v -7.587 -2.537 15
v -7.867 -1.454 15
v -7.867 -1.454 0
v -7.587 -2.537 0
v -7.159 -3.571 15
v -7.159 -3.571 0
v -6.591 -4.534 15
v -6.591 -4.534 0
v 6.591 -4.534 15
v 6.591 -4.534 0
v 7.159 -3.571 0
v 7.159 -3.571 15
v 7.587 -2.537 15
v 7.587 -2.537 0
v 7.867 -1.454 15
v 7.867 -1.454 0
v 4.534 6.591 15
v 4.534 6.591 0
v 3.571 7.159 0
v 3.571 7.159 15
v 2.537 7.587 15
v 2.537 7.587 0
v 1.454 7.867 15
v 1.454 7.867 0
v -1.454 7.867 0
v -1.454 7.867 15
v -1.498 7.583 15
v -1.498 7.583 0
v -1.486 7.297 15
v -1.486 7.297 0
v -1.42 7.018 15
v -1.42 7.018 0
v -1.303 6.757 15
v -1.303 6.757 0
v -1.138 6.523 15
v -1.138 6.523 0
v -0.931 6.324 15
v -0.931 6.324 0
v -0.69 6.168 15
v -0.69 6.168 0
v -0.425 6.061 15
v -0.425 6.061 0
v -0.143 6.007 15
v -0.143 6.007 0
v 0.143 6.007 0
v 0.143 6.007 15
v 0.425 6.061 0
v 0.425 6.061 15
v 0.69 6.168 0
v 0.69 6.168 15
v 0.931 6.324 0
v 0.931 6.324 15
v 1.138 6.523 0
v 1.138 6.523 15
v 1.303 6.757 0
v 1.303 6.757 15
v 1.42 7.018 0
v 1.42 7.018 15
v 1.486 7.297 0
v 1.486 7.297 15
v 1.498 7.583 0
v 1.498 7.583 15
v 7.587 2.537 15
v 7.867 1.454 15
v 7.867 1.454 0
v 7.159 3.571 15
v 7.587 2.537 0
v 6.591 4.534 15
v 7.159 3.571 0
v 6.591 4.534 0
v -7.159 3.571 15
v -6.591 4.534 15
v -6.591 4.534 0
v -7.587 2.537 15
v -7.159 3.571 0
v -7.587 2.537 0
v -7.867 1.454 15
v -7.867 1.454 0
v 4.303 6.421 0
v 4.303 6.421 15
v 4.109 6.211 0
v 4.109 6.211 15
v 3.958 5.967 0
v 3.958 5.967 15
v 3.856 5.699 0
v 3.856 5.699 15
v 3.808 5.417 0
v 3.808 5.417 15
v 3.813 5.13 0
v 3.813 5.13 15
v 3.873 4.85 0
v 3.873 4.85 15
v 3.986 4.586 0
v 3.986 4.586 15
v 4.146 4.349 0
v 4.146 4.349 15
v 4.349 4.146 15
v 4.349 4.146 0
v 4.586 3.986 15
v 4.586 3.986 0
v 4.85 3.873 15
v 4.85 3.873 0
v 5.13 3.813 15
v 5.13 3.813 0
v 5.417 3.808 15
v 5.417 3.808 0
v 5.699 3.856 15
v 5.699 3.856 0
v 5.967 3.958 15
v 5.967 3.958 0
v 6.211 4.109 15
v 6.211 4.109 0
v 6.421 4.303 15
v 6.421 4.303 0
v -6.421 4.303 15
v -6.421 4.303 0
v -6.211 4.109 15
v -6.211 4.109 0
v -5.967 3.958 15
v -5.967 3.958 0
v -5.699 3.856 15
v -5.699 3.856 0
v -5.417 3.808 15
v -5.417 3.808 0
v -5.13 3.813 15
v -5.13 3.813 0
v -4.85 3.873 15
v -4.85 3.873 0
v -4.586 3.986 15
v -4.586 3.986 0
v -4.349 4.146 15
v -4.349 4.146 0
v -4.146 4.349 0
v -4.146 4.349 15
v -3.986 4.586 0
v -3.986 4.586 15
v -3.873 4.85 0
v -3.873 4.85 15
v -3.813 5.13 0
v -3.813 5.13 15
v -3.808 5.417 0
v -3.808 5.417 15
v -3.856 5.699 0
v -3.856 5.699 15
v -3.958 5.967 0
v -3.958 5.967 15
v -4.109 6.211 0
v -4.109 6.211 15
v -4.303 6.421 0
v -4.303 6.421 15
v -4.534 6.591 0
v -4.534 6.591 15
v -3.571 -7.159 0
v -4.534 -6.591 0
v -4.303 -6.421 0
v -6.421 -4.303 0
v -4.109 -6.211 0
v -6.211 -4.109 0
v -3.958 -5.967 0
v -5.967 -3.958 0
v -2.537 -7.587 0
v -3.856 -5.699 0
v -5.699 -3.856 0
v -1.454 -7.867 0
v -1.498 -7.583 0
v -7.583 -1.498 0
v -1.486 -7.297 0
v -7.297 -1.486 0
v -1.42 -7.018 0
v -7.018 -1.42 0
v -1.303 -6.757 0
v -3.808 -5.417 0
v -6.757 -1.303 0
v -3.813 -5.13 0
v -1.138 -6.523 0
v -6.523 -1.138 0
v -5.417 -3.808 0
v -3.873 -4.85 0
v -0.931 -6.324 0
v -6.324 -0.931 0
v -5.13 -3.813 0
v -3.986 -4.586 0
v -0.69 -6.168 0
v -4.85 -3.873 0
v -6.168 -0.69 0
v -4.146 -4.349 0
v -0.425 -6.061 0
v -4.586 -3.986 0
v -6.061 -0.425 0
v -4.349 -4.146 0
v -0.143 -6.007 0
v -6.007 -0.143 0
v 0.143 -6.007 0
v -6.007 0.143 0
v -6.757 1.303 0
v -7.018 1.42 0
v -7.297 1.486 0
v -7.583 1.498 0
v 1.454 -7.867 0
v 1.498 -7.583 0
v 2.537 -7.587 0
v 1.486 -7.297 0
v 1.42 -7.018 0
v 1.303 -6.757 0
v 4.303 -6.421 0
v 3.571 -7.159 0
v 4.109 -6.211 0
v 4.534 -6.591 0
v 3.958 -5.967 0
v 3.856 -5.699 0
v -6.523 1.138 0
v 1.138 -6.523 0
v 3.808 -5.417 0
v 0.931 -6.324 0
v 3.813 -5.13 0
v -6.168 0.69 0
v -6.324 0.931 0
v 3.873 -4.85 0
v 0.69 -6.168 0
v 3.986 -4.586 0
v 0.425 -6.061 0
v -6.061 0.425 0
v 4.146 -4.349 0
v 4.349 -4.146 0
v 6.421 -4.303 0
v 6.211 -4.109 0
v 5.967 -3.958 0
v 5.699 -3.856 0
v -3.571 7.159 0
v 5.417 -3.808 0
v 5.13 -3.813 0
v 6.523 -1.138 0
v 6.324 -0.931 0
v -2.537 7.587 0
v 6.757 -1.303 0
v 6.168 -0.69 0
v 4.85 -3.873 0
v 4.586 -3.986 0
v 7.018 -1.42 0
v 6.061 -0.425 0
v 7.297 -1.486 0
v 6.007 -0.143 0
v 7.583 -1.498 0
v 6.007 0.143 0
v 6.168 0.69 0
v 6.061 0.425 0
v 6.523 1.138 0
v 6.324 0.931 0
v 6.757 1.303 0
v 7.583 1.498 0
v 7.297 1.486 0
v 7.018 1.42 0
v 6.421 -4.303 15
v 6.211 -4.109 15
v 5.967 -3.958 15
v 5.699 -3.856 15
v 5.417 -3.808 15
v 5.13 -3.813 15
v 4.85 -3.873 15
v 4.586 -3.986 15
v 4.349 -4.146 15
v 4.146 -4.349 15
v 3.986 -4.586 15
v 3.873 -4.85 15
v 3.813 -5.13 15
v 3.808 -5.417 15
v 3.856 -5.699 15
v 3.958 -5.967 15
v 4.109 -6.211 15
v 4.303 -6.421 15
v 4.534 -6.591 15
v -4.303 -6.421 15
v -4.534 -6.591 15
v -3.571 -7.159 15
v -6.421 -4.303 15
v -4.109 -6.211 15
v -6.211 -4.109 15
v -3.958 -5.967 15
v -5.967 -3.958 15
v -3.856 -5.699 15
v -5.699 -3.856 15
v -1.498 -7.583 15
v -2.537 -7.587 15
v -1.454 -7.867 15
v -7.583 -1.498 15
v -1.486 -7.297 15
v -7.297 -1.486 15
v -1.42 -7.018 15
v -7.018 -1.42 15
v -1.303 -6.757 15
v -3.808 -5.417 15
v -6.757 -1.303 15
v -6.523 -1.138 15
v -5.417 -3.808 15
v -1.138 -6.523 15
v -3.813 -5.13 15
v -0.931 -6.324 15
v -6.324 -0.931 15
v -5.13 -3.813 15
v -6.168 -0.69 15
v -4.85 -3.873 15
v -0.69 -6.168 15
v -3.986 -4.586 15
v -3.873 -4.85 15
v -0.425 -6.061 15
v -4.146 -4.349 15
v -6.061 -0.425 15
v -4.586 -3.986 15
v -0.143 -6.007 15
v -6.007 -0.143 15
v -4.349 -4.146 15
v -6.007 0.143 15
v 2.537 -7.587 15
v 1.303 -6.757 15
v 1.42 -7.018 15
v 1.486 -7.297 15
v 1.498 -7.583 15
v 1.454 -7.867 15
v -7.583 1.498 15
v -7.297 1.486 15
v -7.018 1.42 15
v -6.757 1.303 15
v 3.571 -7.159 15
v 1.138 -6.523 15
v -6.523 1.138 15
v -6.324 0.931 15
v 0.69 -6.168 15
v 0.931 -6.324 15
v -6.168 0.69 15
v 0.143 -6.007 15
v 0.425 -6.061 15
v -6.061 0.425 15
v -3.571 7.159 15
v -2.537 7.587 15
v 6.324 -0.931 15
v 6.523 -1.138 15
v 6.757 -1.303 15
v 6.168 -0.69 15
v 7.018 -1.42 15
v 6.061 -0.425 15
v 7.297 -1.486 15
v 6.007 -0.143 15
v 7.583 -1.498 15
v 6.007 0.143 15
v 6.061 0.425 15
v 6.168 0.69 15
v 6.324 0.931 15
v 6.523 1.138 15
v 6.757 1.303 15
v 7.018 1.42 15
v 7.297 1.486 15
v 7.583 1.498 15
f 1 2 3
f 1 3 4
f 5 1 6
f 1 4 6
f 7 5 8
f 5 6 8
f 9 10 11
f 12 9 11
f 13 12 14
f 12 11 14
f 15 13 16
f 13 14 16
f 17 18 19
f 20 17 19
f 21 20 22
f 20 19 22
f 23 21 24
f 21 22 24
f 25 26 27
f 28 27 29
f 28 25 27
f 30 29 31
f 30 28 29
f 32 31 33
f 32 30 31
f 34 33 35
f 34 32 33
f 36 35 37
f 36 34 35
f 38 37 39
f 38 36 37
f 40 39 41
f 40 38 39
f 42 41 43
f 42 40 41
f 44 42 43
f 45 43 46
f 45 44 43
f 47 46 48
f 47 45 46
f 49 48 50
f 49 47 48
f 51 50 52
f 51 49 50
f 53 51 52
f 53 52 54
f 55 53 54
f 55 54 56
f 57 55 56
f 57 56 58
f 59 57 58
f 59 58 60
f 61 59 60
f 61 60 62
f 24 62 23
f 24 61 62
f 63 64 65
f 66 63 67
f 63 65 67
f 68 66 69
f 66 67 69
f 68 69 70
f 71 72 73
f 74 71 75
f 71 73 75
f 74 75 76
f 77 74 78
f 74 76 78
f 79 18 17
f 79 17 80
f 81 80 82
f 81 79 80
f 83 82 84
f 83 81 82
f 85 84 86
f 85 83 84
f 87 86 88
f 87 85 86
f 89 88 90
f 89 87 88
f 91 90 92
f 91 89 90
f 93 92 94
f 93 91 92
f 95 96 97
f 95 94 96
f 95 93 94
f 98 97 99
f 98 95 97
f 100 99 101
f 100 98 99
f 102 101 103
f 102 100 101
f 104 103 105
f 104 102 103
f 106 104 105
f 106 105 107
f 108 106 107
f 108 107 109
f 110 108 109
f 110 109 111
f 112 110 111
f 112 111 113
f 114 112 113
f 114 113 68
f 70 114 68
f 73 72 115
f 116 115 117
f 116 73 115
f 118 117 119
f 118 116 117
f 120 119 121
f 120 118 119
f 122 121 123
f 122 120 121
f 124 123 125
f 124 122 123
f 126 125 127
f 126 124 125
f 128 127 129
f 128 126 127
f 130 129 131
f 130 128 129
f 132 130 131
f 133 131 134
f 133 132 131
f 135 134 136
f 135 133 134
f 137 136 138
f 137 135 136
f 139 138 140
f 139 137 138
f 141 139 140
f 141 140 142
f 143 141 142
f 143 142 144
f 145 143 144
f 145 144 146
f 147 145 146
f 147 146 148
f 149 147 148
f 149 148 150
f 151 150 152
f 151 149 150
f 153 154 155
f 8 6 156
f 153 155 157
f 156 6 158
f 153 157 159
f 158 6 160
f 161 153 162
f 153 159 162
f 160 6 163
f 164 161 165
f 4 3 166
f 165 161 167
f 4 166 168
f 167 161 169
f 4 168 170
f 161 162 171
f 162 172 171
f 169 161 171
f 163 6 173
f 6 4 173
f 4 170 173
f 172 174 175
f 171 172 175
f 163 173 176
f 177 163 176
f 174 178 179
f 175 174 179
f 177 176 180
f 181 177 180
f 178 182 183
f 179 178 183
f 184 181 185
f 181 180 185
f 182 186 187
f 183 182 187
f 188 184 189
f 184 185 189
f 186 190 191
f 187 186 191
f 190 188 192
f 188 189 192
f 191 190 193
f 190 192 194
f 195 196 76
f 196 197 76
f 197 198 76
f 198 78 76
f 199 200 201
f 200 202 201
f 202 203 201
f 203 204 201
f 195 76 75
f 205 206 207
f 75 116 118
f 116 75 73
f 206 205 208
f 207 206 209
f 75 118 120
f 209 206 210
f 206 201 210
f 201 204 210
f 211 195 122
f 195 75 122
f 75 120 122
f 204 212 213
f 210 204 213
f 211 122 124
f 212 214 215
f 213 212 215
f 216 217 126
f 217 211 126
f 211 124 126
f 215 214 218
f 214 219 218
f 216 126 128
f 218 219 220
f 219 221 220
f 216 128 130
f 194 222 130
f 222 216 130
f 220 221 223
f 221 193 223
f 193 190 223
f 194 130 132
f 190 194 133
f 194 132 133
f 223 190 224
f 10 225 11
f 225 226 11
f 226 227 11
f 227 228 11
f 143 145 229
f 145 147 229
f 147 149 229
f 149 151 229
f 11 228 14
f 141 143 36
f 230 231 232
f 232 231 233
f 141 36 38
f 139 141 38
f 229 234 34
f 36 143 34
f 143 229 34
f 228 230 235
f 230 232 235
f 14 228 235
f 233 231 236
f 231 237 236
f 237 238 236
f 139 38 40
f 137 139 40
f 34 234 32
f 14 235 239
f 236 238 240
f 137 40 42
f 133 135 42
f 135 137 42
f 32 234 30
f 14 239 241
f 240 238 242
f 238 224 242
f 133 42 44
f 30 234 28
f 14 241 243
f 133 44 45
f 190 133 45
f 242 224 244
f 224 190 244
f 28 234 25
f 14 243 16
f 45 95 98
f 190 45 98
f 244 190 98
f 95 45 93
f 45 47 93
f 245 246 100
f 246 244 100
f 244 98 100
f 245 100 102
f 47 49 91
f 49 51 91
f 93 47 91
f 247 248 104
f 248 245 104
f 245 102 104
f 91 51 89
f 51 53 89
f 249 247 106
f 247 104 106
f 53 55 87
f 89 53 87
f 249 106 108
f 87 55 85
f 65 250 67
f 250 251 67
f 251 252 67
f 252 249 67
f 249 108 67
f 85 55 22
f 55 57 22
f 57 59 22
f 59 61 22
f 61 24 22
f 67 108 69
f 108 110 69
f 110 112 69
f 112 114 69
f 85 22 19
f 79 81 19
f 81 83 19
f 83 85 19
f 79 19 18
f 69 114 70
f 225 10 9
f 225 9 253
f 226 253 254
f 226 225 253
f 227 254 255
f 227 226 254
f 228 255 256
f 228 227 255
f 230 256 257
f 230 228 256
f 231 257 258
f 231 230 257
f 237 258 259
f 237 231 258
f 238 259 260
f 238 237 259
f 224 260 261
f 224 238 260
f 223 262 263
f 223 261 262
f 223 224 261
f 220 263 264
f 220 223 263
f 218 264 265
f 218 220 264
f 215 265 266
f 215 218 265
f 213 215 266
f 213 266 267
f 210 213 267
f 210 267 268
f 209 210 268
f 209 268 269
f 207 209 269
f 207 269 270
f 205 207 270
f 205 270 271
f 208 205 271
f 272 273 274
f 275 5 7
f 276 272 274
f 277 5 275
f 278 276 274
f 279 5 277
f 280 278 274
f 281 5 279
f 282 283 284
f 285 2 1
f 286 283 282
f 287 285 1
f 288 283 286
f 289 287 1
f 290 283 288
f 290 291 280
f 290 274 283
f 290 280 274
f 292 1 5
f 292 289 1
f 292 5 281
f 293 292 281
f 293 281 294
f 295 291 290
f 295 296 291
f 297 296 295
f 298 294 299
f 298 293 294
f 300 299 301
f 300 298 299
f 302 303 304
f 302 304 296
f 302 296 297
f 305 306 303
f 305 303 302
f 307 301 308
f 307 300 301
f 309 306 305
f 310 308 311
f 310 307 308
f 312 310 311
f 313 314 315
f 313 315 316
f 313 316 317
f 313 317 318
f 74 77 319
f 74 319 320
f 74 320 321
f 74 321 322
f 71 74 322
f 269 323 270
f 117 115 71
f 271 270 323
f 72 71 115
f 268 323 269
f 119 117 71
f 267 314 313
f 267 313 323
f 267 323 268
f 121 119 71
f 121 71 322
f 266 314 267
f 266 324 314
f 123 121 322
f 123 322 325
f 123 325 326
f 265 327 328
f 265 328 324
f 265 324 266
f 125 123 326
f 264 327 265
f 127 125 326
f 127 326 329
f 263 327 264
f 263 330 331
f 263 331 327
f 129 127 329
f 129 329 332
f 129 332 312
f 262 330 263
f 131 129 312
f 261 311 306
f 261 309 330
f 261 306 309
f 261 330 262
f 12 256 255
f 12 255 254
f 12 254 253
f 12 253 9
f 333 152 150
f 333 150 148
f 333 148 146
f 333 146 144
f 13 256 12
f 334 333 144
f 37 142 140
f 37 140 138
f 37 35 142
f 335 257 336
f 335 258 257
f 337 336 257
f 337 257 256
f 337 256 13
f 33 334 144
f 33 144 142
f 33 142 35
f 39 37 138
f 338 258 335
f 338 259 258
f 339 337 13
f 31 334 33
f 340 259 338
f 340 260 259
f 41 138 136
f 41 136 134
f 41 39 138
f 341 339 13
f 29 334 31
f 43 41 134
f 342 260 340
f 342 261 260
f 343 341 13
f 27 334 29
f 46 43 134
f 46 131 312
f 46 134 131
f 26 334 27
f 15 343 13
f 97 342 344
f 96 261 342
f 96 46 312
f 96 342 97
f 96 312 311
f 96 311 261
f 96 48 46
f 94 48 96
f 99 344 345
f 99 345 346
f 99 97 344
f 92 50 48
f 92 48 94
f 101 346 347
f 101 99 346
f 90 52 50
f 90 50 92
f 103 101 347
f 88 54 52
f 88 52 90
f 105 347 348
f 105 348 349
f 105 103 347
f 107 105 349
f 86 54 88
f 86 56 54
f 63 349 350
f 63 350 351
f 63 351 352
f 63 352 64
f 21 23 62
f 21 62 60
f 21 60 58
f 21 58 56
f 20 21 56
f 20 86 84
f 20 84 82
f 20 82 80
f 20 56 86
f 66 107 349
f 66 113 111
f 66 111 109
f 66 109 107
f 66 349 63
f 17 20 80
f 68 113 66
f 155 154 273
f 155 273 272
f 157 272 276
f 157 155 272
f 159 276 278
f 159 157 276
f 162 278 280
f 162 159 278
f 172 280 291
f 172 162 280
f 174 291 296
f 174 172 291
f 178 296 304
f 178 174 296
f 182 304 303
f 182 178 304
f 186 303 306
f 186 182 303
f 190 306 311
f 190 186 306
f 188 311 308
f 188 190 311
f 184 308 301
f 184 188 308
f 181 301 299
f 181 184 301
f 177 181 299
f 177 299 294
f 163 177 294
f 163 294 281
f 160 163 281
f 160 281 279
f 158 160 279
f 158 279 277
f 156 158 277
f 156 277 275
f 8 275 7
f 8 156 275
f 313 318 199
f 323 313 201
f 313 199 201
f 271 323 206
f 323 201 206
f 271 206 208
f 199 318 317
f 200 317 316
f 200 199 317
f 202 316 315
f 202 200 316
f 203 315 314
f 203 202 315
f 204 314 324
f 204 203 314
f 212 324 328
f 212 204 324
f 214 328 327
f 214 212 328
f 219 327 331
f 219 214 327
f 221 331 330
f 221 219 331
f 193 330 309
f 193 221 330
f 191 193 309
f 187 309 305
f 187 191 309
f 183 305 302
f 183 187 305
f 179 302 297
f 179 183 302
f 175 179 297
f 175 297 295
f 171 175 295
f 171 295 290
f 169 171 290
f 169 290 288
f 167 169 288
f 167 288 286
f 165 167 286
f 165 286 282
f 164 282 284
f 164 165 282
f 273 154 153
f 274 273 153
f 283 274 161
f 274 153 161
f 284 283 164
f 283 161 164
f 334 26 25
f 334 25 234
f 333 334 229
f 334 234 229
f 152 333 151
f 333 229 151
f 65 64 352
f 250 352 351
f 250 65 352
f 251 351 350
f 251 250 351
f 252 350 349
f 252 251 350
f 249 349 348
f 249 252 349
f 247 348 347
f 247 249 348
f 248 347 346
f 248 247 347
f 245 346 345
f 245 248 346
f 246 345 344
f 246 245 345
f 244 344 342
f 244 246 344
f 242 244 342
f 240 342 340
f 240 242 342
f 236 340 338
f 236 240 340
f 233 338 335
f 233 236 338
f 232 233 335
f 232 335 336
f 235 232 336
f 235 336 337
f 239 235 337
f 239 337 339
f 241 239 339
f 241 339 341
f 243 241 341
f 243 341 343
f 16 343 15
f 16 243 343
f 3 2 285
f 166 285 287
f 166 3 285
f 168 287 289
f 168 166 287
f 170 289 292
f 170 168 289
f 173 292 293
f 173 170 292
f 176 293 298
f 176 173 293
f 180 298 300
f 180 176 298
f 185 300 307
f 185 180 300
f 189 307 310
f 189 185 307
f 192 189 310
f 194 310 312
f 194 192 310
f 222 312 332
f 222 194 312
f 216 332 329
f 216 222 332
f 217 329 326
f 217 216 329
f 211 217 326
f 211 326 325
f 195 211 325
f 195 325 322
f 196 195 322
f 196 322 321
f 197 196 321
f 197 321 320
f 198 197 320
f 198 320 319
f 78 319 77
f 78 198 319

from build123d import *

# Parameters (mm, degrees)
CYLINDER001_R     = 1.5
CYLINDER001_DEPTH = 30
ARRAY_COUNT       = 8
CYLINDER_R        = 8
CYLINDER_DEPTH    = 15


with BuildPart() as array:
    # Cylinder001 → Cylinder001 (new body)
    with BuildSketch(Plane(origin=(7.5, 0, 0), x_dir=(1, 0, 0), z_dir=(0, 0, 1))):
        Circle(CYLINDER001_R)
    extrude(amount=CYLINDER001_DEPTH)

    # Array: Array ×8 about axis
    array_axis = Axis((0, 0, 0), (0, 0, 1))


with BuildPart() as array_1:
    add(array.part)
    for i in range(1, ARRAY_COUNT):
        add(array.part.rotate(array_axis, i * 360 / ARRAY_COUNT))


with BuildPart() as cut:
    # Cylinder → Cylinder (new body)
    with BuildSketch(Plane.XY):
        Circle(CYLINDER_R)
    extrude(amount=CYLINDER_DEPTH)

    # Cut: cut Array
    add(array_1.part, mode=Mode.SUBTRACT)


solid = cut.part
